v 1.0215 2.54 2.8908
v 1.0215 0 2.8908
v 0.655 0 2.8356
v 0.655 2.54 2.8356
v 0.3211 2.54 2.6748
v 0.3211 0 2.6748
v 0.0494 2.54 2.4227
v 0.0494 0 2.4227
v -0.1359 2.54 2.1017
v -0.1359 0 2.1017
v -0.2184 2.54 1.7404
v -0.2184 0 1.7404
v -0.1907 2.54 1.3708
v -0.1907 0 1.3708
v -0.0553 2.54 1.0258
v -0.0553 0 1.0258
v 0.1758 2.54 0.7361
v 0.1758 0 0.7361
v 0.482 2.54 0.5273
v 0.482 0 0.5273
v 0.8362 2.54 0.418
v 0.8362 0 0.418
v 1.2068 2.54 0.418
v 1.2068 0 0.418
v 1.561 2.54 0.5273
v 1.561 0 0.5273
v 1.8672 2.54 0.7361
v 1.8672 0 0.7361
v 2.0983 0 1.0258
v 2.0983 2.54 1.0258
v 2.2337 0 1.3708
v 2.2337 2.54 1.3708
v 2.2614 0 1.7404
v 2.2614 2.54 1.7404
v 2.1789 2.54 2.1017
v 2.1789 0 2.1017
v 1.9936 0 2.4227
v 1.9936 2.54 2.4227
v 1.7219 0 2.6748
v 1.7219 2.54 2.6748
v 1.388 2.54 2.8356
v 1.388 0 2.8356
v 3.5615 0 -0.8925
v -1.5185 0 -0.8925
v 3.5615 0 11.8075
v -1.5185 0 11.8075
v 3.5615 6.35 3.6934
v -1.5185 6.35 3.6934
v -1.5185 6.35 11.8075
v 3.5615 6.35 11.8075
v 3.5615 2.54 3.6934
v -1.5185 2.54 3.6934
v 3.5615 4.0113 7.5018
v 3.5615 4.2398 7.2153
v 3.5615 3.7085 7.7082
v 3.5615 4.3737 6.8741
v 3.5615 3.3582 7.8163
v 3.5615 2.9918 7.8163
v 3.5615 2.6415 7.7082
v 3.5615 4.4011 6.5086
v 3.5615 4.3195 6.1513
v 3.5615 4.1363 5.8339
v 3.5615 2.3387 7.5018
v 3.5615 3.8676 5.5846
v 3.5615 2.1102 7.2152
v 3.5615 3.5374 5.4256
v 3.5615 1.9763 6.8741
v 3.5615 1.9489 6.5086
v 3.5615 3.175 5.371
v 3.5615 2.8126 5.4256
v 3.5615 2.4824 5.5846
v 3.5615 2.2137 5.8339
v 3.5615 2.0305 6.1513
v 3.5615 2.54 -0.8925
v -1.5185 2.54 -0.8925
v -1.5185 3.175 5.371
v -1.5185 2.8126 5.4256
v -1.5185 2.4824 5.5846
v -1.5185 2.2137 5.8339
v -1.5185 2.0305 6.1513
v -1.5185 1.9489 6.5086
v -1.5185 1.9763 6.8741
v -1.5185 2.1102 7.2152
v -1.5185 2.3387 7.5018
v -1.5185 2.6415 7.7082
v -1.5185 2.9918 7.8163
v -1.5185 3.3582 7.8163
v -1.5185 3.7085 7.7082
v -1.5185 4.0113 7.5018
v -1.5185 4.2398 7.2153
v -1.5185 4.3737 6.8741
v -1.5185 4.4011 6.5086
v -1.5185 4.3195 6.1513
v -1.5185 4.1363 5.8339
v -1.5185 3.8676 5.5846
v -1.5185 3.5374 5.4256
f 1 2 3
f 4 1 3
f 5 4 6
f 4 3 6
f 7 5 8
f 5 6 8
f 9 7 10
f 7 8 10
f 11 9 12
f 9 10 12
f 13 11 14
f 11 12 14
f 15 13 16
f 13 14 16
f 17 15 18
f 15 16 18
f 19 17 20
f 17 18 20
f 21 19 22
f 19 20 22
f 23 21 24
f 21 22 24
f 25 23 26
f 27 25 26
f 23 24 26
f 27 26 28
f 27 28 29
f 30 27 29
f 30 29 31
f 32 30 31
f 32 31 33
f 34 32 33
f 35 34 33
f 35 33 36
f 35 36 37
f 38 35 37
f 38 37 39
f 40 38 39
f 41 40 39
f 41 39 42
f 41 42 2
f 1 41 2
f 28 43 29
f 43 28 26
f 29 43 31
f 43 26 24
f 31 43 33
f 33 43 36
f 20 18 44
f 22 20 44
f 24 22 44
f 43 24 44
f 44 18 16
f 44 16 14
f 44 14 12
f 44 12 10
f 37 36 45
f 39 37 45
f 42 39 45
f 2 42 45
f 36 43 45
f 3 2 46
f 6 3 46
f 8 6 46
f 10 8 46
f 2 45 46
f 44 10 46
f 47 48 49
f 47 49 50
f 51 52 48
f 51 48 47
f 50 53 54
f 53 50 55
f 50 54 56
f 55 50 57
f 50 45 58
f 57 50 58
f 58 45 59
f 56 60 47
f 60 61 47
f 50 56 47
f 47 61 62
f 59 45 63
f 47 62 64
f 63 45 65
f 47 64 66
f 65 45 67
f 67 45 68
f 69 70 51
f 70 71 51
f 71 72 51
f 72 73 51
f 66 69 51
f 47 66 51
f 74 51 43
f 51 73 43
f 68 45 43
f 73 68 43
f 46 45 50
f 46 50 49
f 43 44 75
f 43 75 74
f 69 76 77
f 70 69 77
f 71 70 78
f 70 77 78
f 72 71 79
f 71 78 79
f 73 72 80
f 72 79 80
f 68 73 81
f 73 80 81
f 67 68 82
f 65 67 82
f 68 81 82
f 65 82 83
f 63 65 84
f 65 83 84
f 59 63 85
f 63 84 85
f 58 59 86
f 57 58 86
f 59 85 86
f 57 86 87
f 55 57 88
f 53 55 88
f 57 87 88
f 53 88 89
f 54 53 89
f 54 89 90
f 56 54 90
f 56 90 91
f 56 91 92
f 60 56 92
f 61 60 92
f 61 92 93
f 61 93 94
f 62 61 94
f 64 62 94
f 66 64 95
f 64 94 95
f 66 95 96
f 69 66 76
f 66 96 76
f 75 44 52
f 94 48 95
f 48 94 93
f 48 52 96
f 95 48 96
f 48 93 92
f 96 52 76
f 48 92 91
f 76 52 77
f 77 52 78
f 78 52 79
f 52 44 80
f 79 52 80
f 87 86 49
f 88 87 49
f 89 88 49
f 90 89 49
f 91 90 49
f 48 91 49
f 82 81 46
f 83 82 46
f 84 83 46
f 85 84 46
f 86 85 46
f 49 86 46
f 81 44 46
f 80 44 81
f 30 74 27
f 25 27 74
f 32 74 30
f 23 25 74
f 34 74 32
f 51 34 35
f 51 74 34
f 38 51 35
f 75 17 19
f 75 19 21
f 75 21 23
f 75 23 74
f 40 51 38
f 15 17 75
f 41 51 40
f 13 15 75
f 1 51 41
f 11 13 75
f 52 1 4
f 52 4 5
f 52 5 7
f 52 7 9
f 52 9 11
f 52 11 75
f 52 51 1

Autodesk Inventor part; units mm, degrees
ref_plane "YZ Plane" through (0, 0, 0) normal (1, 0, 0) x (0, 1, 0)
ref_plane "XZ Plane" through (0, 0, 0) normal (0, 1, 0) x (-1, 0, 0)
ref_plane "XY Plane" through (0, 0, 0) normal (0, 0, 1) x (1, 0, 0)
sketch "Sketch20" plane through (0, 0, 0) normal (0, 1, 0) x (-1, 0, 0)
  line L0 (1.5185, -0.8925) -> (-3.5615, -0.8925)
  line L1 (-3.5615, -0.8925) -> (-3.5615, 11.8075)
  line L2 (-3.5615, 11.8075) -> (1.5185, 11.8075)
  line L3 (1.5185, 11.8075) -> (1.5185, -0.8925)
  line L4 (1.5185, 4.9634) -> (-3.5615, 4.9634)
  point P0 (0, 0)
  dimension "d56" = 5.08
  dimension "d57" = 12.7
extrude "Extrusion7" add sketch "Sketch20" along normal blind 2.54 contours L0 L1 L4 L3
extrude "Extrusion8" add sketch "Sketch20" along normal blind 6.35 contours L4 L1 L2 L3
sketch "Sketch21" plane through (0, 2.54, 0) normal (0, 1, 0) x (1, 0, 0)
  line L0 (3.5615, 0.8925) -> (-1.5185, 0.8925) projected
  line L1 (-1.5185, 0.8925) -> (-1.5185, -4.9634) projected
  point P0 (0, 0)
  point P1 (1.0215, -1.6475)
  dimension "d62" = 2.54
  dimension "d63" = 2.54
hole "Hole5" at (1.0215, 2.54, 1.6475) direction (0, -1, 0) diameter 2.4867 end through all
sketch "Sketch22" plane through (3.5615, 0, -0.8925) normal (1, 0, 0) x (0, 0, -1)
  line L0 (-12.7, 6.35) -> (-5.8558, 6.35) projected
  line L1 (-12.7, 0) -> (-12.7, 6.35) projected
  point P0 (-0.8925, 0)
  point P1 (-7.493, 3.175)
  dimension "d71" = 3.175
  dimension "d72" = 5.207
hole "Hole6" at (3.5615, 3.175, 6.6005) direction (-1, 0, 0) diameter 2.459 end through all thread size "M3x0.5" class "6H" standard "ISO Metric profile"
sketch "Sketch23" plane through (0, 2.54, 0) normal (0, 1, 0) x (1, 0, 0)
  line L0 (-1.5185, 0.8925) -> (-1.5185, -4.9634) projected
  line L1 (-1.5185, -4.9634) -> (-1.5185, -3.6934)
  line L2 (-1.5185, -3.6934) -> (3.5615, -3.6934)
  line L3 (3.5615, -4.9634) -> (3.5615, 0.8925) projected
  line L4 (3.5615, -3.6934) -> (3.5615, -4.9634)
  line L5 (3.5615, -11.8075) -> (3.5615, 0.8925) projected
  line L6 (3.5615, -4.9634) -> (-1.5185, -4.9634) projected
  line L7 (-1.5185, -4.9634) -> (3.5615, -4.9634)
  point P0 (0, 0)
  dimension "d80" = 1.27
extrude "Extrusion9" add sketch "Sketch23" along normal blind 3.81
properties part number "filament holders"
